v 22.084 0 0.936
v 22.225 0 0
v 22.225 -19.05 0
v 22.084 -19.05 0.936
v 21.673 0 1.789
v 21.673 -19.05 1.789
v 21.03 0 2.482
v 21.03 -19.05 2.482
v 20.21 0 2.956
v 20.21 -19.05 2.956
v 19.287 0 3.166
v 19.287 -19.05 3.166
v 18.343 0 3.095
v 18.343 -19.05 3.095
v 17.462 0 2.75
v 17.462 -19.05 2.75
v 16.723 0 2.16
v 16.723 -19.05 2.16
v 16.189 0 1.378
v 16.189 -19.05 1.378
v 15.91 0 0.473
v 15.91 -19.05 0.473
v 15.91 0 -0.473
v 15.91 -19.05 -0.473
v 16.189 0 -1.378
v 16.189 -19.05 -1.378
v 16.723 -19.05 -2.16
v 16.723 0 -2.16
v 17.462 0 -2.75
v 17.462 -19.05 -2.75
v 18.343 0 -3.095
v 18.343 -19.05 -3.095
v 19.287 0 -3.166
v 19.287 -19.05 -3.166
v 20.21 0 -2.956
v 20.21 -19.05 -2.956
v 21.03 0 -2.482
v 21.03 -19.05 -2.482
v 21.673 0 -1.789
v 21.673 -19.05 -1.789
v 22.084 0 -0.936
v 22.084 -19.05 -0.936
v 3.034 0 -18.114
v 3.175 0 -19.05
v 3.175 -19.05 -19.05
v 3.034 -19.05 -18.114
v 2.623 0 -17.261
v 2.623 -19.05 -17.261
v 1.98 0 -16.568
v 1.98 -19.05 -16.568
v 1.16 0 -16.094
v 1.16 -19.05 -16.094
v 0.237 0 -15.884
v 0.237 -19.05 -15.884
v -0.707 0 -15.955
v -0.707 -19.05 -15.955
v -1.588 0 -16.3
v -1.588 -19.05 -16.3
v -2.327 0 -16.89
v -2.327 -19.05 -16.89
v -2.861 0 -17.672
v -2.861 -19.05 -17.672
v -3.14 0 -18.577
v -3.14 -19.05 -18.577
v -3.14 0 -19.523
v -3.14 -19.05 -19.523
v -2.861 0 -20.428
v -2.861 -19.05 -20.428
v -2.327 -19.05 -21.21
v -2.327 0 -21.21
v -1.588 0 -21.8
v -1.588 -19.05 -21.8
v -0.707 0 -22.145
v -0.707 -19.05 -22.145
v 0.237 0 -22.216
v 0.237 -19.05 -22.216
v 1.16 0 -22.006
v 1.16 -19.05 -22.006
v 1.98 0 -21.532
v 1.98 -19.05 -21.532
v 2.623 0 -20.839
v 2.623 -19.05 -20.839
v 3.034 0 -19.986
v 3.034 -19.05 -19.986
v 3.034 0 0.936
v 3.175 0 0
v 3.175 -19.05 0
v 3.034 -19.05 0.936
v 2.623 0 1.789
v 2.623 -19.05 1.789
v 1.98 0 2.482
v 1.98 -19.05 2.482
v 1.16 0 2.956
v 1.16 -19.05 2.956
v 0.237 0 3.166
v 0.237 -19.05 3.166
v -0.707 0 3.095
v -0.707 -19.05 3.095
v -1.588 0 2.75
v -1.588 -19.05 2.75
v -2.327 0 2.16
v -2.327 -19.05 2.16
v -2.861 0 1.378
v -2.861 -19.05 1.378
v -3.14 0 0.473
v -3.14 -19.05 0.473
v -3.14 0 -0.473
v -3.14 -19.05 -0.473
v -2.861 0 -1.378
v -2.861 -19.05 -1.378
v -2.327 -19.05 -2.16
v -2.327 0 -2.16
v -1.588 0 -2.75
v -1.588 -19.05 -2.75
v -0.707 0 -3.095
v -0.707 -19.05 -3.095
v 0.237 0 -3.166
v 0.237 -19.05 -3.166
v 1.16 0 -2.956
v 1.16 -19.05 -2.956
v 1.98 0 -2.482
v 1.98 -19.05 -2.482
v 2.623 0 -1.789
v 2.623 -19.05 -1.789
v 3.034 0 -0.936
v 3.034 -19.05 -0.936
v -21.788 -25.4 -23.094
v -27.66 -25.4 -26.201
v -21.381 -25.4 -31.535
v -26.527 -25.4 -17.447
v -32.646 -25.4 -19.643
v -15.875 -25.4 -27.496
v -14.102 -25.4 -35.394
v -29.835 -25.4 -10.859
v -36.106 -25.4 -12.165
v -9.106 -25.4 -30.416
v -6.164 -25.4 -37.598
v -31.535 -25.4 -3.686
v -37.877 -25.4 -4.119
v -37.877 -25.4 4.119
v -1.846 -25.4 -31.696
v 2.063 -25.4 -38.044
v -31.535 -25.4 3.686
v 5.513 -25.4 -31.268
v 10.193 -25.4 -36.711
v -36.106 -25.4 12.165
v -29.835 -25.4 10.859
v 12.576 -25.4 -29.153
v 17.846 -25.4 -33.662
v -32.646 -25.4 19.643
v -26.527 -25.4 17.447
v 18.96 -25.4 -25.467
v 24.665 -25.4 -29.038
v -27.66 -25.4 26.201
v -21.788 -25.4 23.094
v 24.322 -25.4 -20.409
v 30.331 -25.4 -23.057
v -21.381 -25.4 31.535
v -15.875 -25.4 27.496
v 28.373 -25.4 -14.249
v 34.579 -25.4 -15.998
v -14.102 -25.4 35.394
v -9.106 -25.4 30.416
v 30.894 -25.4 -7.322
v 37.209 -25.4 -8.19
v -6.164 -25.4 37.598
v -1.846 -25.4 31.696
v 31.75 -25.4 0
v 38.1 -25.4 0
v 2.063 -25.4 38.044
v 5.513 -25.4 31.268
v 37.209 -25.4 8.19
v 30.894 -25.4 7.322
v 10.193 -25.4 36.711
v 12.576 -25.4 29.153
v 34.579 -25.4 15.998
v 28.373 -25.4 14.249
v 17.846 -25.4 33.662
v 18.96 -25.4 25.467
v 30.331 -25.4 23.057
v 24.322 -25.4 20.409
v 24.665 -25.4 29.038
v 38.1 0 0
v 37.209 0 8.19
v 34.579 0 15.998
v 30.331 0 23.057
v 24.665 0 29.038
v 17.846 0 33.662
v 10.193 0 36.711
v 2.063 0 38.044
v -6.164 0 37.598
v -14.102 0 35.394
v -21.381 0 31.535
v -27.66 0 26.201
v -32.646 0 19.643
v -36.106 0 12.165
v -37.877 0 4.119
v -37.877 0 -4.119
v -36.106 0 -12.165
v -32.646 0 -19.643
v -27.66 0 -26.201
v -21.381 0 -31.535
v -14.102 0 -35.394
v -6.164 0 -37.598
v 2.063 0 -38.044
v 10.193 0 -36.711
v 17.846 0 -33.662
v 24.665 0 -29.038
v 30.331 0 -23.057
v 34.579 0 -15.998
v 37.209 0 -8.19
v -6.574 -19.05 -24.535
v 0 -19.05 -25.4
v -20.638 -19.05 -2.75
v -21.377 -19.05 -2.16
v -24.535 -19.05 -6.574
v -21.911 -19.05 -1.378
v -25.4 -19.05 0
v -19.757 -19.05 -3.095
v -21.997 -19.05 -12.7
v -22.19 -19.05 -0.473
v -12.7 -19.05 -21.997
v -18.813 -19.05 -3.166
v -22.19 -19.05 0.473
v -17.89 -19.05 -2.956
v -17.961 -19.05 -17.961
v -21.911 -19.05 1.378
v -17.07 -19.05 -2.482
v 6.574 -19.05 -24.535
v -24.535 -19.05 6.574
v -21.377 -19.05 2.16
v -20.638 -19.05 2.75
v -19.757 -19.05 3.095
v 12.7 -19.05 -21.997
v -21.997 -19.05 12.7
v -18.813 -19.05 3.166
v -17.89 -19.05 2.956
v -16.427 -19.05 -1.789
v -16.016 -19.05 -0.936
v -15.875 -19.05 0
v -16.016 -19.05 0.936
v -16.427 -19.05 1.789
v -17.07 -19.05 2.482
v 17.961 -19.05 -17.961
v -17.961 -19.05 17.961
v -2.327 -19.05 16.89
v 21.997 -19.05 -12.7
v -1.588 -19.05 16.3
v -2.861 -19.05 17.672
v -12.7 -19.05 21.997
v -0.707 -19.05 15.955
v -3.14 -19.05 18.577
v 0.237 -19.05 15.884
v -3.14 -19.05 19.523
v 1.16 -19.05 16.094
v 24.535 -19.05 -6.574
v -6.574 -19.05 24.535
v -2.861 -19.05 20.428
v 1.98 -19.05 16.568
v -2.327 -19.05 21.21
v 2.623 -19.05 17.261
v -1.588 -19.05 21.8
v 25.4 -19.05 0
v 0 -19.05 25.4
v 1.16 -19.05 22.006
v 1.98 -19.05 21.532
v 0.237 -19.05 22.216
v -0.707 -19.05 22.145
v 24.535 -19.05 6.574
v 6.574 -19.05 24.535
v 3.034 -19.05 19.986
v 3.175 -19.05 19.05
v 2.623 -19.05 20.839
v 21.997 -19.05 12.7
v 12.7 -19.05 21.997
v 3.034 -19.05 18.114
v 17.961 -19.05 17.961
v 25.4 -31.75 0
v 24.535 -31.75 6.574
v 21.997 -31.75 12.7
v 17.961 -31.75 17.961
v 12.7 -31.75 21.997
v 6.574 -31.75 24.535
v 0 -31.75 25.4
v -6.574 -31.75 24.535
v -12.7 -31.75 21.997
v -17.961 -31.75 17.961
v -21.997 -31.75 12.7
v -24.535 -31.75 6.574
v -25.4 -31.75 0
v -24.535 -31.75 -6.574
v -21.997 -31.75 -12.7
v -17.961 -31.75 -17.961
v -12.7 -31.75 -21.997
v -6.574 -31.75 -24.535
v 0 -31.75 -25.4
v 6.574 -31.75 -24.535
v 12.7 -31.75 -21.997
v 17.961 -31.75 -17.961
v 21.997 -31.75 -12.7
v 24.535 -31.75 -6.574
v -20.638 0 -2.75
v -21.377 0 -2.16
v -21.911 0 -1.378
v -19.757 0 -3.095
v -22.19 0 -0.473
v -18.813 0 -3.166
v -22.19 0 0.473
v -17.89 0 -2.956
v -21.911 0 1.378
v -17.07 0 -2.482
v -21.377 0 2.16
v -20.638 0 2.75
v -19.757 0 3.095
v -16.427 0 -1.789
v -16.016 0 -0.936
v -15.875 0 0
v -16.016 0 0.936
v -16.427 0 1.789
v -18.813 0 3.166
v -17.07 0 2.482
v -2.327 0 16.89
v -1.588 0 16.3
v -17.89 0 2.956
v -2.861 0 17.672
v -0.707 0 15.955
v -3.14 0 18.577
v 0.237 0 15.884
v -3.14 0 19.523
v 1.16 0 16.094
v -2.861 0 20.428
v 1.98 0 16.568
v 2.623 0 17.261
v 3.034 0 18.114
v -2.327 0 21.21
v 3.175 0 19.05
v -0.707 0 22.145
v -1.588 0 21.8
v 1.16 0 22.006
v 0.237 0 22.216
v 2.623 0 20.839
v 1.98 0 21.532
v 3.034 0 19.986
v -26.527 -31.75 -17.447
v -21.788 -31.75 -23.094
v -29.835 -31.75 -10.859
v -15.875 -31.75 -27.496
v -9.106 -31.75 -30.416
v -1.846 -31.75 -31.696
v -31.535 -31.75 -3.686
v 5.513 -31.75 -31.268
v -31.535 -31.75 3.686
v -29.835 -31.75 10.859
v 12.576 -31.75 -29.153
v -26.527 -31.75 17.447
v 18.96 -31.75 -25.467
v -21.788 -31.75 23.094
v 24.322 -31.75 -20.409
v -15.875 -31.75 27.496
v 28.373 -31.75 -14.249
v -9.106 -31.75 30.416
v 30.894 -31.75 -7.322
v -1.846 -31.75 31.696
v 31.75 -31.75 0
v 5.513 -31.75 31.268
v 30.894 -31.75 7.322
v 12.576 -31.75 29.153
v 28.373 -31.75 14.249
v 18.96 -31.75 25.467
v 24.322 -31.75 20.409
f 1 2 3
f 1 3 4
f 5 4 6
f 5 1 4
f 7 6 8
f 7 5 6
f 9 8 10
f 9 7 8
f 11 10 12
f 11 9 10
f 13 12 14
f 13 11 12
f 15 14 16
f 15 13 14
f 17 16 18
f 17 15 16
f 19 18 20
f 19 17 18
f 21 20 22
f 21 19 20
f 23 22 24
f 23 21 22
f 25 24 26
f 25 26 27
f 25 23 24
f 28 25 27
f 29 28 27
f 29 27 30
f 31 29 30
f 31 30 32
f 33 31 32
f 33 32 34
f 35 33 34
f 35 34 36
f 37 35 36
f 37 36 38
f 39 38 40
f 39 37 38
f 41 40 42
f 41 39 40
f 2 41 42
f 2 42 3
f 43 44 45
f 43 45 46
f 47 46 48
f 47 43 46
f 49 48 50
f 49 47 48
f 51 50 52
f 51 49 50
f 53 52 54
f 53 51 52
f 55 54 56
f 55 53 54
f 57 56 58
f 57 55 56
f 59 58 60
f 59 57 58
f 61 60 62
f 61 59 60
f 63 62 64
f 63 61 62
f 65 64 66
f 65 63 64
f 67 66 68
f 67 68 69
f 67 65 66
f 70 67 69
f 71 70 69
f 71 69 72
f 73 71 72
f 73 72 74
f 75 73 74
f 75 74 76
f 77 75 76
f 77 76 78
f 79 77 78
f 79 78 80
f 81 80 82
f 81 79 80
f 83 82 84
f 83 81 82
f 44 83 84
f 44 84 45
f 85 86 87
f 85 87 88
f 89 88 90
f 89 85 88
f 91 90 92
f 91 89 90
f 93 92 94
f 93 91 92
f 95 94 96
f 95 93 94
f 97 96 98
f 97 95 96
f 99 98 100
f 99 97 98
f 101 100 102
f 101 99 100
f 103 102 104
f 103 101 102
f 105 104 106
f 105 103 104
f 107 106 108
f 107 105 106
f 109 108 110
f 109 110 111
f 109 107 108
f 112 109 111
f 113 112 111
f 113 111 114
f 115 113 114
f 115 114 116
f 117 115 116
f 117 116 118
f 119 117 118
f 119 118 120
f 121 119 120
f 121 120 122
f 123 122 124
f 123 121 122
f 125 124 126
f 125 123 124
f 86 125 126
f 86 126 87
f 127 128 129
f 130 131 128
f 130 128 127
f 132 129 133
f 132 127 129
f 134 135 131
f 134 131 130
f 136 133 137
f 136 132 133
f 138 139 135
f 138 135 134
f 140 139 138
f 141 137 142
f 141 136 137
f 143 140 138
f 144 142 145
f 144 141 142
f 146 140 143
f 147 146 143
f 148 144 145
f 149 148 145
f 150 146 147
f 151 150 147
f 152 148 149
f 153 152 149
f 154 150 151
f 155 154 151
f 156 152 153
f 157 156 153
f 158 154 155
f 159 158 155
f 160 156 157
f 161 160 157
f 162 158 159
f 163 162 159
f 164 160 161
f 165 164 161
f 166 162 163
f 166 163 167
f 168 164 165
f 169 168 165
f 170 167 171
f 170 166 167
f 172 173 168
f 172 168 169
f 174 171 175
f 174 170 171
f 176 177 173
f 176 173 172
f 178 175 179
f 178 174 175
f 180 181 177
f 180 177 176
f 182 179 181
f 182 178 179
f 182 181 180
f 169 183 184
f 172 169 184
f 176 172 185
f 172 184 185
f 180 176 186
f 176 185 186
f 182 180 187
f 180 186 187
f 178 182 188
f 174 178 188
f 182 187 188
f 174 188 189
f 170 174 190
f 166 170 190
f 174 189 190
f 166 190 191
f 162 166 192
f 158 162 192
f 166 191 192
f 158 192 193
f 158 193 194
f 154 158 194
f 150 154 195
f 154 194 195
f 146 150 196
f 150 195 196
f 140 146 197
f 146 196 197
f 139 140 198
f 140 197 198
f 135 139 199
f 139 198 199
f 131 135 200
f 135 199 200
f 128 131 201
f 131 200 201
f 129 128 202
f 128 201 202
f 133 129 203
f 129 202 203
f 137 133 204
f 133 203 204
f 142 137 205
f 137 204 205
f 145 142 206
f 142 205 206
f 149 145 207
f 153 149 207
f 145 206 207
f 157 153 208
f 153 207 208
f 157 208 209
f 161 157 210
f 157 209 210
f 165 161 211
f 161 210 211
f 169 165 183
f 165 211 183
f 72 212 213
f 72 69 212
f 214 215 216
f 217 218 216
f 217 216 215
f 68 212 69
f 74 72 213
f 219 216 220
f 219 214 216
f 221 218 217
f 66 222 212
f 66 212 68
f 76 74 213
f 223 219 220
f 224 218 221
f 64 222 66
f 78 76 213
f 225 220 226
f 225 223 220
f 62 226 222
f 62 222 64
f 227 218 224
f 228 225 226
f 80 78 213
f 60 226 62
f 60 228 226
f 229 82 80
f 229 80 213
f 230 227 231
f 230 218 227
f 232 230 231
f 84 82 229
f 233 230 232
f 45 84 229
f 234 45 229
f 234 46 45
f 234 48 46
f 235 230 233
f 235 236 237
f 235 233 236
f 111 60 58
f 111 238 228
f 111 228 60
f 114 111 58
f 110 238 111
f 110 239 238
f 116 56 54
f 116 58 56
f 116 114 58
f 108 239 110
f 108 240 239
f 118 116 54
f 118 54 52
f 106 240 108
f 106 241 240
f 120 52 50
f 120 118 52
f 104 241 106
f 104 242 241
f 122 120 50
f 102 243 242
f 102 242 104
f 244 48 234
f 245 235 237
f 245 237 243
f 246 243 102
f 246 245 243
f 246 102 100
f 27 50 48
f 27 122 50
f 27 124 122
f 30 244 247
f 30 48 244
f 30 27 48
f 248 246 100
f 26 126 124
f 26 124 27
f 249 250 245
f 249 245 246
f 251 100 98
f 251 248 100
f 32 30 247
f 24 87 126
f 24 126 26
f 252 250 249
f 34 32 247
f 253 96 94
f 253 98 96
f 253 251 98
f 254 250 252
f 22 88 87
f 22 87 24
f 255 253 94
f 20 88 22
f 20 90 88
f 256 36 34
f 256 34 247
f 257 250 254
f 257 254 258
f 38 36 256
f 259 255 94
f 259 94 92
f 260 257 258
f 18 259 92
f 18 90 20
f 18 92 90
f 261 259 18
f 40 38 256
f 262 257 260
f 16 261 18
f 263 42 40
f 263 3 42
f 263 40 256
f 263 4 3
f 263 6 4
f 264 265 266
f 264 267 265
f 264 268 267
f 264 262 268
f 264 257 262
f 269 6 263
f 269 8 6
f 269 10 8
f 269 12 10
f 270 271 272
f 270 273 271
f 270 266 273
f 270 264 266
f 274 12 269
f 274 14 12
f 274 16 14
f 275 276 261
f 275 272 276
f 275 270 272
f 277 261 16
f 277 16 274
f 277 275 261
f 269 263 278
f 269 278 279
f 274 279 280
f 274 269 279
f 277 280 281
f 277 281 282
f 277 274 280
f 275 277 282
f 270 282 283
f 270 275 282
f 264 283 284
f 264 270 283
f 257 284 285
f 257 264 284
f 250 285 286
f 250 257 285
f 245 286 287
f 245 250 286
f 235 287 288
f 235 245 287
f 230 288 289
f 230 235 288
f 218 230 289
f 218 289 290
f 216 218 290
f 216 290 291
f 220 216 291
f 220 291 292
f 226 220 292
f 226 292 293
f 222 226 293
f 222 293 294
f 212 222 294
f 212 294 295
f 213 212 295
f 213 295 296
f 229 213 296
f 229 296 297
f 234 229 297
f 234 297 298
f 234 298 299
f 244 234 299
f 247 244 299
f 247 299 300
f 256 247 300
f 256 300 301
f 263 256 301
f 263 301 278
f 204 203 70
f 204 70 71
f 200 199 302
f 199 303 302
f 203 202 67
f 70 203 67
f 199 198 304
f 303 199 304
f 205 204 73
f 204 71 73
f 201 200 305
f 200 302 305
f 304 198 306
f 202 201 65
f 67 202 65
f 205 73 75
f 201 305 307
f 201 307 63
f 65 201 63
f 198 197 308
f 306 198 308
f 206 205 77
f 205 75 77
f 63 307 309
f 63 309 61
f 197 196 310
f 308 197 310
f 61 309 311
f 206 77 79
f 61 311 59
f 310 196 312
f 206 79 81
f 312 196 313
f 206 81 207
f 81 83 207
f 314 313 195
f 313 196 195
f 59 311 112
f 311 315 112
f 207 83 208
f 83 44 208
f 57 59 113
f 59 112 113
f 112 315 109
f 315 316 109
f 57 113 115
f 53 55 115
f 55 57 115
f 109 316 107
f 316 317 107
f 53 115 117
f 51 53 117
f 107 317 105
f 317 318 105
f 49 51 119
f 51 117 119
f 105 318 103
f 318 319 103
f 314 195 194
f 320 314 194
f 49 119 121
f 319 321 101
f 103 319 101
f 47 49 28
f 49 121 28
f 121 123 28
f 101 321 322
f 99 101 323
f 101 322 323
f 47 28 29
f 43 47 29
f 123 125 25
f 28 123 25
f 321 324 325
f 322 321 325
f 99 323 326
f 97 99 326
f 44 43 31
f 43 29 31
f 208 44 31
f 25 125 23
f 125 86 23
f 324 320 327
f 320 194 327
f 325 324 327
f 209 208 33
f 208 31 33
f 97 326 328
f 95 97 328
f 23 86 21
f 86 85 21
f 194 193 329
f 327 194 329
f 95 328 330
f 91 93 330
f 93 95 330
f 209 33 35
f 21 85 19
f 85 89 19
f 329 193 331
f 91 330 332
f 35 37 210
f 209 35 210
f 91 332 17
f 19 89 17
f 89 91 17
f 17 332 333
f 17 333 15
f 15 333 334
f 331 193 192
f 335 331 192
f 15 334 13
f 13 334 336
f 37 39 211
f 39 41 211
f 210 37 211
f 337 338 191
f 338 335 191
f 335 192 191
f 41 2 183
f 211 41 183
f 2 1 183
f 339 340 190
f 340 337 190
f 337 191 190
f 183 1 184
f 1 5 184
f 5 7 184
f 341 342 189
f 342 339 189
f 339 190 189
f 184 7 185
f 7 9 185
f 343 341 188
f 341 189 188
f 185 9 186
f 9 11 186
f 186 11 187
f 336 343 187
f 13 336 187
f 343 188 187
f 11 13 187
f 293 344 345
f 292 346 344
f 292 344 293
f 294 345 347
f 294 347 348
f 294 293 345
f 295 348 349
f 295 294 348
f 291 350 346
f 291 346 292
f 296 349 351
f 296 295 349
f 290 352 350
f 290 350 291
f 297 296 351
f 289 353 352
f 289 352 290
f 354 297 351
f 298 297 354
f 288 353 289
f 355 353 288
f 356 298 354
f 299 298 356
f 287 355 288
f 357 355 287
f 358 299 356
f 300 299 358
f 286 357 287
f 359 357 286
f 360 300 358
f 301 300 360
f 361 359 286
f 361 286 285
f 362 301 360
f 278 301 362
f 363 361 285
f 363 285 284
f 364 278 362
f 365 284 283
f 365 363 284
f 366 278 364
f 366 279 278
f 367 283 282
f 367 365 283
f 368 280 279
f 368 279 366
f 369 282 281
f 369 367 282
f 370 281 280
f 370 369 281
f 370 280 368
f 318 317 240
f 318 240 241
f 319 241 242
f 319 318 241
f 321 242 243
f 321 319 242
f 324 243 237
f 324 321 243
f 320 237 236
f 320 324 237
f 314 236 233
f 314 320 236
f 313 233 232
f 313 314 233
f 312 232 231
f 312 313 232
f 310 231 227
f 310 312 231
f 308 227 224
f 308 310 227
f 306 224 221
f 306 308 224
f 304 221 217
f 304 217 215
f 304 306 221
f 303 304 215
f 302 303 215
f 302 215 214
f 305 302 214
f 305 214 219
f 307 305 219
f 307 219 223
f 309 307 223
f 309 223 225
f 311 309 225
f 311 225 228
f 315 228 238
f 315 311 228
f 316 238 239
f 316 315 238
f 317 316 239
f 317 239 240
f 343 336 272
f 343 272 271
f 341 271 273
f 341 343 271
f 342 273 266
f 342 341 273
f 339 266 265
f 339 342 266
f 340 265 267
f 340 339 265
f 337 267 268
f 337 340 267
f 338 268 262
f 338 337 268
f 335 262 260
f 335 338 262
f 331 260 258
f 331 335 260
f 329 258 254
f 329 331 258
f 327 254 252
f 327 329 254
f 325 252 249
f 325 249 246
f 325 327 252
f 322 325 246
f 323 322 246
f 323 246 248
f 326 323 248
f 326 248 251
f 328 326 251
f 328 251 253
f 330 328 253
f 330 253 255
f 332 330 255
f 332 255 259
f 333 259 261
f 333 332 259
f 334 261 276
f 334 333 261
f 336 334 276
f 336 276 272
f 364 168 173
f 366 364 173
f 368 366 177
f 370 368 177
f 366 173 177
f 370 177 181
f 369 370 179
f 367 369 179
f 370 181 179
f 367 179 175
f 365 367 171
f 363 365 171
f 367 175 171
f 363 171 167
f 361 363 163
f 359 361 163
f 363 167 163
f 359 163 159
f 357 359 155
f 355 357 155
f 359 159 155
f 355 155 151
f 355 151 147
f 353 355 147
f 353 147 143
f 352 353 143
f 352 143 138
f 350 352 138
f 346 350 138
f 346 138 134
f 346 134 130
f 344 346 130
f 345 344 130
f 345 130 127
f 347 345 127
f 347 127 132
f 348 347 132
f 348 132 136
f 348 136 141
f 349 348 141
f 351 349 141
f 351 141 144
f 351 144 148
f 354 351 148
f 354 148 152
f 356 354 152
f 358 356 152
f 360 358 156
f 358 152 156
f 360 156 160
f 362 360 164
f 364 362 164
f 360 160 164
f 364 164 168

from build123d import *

# Parameters (mm, degrees)
F0_R     = 38.1
F0_R_2   = 31.75
F1_DEPTH = 25.4
F0_R_3   = 25.4
F2_DEPTH = 31.75
F0_R_4   = 3.175
F3_DEPTH = 19.05


with BuildPart() as f1:
    # F0 (on Front) → F1 (new body)
    with BuildSketch(Plane.XZ):
        Circle(F0_R)
        Circle(F0_R_2, mode=Mode.SUBTRACT)
    extrude(amount=F1_DEPTH)

    # F0 (on Front) → F2 (join)
    with BuildSketch(Plane.XZ):
        Circle(F0_R_2)
        Circle(F0_R_3, mode=Mode.SUBTRACT)
    extrude(amount=F2_DEPTH)

    # F0 (on Front) → F3 (join)
    with BuildSketch(Plane.XZ):
        Circle(F0_R_3)
        with Locations((0, -19.05)):
            Circle(F0_R_4, mode=Mode.SUBTRACT)
        with Locations((-19.05, 0)):
            Circle(F0_R_4, mode=Mode.SUBTRACT)
        Circle(F0_R_4, mode=Mode.SUBTRACT)
        with Locations((19.05, 0)):
            Circle(F0_R_4, mode=Mode.SUBTRACT)
        with Locations((0, 19.05)):
            Circle(F0_R_4, mode=Mode.SUBTRACT)
    extrude(amount=F3_DEPTH)


solid = f1.part
